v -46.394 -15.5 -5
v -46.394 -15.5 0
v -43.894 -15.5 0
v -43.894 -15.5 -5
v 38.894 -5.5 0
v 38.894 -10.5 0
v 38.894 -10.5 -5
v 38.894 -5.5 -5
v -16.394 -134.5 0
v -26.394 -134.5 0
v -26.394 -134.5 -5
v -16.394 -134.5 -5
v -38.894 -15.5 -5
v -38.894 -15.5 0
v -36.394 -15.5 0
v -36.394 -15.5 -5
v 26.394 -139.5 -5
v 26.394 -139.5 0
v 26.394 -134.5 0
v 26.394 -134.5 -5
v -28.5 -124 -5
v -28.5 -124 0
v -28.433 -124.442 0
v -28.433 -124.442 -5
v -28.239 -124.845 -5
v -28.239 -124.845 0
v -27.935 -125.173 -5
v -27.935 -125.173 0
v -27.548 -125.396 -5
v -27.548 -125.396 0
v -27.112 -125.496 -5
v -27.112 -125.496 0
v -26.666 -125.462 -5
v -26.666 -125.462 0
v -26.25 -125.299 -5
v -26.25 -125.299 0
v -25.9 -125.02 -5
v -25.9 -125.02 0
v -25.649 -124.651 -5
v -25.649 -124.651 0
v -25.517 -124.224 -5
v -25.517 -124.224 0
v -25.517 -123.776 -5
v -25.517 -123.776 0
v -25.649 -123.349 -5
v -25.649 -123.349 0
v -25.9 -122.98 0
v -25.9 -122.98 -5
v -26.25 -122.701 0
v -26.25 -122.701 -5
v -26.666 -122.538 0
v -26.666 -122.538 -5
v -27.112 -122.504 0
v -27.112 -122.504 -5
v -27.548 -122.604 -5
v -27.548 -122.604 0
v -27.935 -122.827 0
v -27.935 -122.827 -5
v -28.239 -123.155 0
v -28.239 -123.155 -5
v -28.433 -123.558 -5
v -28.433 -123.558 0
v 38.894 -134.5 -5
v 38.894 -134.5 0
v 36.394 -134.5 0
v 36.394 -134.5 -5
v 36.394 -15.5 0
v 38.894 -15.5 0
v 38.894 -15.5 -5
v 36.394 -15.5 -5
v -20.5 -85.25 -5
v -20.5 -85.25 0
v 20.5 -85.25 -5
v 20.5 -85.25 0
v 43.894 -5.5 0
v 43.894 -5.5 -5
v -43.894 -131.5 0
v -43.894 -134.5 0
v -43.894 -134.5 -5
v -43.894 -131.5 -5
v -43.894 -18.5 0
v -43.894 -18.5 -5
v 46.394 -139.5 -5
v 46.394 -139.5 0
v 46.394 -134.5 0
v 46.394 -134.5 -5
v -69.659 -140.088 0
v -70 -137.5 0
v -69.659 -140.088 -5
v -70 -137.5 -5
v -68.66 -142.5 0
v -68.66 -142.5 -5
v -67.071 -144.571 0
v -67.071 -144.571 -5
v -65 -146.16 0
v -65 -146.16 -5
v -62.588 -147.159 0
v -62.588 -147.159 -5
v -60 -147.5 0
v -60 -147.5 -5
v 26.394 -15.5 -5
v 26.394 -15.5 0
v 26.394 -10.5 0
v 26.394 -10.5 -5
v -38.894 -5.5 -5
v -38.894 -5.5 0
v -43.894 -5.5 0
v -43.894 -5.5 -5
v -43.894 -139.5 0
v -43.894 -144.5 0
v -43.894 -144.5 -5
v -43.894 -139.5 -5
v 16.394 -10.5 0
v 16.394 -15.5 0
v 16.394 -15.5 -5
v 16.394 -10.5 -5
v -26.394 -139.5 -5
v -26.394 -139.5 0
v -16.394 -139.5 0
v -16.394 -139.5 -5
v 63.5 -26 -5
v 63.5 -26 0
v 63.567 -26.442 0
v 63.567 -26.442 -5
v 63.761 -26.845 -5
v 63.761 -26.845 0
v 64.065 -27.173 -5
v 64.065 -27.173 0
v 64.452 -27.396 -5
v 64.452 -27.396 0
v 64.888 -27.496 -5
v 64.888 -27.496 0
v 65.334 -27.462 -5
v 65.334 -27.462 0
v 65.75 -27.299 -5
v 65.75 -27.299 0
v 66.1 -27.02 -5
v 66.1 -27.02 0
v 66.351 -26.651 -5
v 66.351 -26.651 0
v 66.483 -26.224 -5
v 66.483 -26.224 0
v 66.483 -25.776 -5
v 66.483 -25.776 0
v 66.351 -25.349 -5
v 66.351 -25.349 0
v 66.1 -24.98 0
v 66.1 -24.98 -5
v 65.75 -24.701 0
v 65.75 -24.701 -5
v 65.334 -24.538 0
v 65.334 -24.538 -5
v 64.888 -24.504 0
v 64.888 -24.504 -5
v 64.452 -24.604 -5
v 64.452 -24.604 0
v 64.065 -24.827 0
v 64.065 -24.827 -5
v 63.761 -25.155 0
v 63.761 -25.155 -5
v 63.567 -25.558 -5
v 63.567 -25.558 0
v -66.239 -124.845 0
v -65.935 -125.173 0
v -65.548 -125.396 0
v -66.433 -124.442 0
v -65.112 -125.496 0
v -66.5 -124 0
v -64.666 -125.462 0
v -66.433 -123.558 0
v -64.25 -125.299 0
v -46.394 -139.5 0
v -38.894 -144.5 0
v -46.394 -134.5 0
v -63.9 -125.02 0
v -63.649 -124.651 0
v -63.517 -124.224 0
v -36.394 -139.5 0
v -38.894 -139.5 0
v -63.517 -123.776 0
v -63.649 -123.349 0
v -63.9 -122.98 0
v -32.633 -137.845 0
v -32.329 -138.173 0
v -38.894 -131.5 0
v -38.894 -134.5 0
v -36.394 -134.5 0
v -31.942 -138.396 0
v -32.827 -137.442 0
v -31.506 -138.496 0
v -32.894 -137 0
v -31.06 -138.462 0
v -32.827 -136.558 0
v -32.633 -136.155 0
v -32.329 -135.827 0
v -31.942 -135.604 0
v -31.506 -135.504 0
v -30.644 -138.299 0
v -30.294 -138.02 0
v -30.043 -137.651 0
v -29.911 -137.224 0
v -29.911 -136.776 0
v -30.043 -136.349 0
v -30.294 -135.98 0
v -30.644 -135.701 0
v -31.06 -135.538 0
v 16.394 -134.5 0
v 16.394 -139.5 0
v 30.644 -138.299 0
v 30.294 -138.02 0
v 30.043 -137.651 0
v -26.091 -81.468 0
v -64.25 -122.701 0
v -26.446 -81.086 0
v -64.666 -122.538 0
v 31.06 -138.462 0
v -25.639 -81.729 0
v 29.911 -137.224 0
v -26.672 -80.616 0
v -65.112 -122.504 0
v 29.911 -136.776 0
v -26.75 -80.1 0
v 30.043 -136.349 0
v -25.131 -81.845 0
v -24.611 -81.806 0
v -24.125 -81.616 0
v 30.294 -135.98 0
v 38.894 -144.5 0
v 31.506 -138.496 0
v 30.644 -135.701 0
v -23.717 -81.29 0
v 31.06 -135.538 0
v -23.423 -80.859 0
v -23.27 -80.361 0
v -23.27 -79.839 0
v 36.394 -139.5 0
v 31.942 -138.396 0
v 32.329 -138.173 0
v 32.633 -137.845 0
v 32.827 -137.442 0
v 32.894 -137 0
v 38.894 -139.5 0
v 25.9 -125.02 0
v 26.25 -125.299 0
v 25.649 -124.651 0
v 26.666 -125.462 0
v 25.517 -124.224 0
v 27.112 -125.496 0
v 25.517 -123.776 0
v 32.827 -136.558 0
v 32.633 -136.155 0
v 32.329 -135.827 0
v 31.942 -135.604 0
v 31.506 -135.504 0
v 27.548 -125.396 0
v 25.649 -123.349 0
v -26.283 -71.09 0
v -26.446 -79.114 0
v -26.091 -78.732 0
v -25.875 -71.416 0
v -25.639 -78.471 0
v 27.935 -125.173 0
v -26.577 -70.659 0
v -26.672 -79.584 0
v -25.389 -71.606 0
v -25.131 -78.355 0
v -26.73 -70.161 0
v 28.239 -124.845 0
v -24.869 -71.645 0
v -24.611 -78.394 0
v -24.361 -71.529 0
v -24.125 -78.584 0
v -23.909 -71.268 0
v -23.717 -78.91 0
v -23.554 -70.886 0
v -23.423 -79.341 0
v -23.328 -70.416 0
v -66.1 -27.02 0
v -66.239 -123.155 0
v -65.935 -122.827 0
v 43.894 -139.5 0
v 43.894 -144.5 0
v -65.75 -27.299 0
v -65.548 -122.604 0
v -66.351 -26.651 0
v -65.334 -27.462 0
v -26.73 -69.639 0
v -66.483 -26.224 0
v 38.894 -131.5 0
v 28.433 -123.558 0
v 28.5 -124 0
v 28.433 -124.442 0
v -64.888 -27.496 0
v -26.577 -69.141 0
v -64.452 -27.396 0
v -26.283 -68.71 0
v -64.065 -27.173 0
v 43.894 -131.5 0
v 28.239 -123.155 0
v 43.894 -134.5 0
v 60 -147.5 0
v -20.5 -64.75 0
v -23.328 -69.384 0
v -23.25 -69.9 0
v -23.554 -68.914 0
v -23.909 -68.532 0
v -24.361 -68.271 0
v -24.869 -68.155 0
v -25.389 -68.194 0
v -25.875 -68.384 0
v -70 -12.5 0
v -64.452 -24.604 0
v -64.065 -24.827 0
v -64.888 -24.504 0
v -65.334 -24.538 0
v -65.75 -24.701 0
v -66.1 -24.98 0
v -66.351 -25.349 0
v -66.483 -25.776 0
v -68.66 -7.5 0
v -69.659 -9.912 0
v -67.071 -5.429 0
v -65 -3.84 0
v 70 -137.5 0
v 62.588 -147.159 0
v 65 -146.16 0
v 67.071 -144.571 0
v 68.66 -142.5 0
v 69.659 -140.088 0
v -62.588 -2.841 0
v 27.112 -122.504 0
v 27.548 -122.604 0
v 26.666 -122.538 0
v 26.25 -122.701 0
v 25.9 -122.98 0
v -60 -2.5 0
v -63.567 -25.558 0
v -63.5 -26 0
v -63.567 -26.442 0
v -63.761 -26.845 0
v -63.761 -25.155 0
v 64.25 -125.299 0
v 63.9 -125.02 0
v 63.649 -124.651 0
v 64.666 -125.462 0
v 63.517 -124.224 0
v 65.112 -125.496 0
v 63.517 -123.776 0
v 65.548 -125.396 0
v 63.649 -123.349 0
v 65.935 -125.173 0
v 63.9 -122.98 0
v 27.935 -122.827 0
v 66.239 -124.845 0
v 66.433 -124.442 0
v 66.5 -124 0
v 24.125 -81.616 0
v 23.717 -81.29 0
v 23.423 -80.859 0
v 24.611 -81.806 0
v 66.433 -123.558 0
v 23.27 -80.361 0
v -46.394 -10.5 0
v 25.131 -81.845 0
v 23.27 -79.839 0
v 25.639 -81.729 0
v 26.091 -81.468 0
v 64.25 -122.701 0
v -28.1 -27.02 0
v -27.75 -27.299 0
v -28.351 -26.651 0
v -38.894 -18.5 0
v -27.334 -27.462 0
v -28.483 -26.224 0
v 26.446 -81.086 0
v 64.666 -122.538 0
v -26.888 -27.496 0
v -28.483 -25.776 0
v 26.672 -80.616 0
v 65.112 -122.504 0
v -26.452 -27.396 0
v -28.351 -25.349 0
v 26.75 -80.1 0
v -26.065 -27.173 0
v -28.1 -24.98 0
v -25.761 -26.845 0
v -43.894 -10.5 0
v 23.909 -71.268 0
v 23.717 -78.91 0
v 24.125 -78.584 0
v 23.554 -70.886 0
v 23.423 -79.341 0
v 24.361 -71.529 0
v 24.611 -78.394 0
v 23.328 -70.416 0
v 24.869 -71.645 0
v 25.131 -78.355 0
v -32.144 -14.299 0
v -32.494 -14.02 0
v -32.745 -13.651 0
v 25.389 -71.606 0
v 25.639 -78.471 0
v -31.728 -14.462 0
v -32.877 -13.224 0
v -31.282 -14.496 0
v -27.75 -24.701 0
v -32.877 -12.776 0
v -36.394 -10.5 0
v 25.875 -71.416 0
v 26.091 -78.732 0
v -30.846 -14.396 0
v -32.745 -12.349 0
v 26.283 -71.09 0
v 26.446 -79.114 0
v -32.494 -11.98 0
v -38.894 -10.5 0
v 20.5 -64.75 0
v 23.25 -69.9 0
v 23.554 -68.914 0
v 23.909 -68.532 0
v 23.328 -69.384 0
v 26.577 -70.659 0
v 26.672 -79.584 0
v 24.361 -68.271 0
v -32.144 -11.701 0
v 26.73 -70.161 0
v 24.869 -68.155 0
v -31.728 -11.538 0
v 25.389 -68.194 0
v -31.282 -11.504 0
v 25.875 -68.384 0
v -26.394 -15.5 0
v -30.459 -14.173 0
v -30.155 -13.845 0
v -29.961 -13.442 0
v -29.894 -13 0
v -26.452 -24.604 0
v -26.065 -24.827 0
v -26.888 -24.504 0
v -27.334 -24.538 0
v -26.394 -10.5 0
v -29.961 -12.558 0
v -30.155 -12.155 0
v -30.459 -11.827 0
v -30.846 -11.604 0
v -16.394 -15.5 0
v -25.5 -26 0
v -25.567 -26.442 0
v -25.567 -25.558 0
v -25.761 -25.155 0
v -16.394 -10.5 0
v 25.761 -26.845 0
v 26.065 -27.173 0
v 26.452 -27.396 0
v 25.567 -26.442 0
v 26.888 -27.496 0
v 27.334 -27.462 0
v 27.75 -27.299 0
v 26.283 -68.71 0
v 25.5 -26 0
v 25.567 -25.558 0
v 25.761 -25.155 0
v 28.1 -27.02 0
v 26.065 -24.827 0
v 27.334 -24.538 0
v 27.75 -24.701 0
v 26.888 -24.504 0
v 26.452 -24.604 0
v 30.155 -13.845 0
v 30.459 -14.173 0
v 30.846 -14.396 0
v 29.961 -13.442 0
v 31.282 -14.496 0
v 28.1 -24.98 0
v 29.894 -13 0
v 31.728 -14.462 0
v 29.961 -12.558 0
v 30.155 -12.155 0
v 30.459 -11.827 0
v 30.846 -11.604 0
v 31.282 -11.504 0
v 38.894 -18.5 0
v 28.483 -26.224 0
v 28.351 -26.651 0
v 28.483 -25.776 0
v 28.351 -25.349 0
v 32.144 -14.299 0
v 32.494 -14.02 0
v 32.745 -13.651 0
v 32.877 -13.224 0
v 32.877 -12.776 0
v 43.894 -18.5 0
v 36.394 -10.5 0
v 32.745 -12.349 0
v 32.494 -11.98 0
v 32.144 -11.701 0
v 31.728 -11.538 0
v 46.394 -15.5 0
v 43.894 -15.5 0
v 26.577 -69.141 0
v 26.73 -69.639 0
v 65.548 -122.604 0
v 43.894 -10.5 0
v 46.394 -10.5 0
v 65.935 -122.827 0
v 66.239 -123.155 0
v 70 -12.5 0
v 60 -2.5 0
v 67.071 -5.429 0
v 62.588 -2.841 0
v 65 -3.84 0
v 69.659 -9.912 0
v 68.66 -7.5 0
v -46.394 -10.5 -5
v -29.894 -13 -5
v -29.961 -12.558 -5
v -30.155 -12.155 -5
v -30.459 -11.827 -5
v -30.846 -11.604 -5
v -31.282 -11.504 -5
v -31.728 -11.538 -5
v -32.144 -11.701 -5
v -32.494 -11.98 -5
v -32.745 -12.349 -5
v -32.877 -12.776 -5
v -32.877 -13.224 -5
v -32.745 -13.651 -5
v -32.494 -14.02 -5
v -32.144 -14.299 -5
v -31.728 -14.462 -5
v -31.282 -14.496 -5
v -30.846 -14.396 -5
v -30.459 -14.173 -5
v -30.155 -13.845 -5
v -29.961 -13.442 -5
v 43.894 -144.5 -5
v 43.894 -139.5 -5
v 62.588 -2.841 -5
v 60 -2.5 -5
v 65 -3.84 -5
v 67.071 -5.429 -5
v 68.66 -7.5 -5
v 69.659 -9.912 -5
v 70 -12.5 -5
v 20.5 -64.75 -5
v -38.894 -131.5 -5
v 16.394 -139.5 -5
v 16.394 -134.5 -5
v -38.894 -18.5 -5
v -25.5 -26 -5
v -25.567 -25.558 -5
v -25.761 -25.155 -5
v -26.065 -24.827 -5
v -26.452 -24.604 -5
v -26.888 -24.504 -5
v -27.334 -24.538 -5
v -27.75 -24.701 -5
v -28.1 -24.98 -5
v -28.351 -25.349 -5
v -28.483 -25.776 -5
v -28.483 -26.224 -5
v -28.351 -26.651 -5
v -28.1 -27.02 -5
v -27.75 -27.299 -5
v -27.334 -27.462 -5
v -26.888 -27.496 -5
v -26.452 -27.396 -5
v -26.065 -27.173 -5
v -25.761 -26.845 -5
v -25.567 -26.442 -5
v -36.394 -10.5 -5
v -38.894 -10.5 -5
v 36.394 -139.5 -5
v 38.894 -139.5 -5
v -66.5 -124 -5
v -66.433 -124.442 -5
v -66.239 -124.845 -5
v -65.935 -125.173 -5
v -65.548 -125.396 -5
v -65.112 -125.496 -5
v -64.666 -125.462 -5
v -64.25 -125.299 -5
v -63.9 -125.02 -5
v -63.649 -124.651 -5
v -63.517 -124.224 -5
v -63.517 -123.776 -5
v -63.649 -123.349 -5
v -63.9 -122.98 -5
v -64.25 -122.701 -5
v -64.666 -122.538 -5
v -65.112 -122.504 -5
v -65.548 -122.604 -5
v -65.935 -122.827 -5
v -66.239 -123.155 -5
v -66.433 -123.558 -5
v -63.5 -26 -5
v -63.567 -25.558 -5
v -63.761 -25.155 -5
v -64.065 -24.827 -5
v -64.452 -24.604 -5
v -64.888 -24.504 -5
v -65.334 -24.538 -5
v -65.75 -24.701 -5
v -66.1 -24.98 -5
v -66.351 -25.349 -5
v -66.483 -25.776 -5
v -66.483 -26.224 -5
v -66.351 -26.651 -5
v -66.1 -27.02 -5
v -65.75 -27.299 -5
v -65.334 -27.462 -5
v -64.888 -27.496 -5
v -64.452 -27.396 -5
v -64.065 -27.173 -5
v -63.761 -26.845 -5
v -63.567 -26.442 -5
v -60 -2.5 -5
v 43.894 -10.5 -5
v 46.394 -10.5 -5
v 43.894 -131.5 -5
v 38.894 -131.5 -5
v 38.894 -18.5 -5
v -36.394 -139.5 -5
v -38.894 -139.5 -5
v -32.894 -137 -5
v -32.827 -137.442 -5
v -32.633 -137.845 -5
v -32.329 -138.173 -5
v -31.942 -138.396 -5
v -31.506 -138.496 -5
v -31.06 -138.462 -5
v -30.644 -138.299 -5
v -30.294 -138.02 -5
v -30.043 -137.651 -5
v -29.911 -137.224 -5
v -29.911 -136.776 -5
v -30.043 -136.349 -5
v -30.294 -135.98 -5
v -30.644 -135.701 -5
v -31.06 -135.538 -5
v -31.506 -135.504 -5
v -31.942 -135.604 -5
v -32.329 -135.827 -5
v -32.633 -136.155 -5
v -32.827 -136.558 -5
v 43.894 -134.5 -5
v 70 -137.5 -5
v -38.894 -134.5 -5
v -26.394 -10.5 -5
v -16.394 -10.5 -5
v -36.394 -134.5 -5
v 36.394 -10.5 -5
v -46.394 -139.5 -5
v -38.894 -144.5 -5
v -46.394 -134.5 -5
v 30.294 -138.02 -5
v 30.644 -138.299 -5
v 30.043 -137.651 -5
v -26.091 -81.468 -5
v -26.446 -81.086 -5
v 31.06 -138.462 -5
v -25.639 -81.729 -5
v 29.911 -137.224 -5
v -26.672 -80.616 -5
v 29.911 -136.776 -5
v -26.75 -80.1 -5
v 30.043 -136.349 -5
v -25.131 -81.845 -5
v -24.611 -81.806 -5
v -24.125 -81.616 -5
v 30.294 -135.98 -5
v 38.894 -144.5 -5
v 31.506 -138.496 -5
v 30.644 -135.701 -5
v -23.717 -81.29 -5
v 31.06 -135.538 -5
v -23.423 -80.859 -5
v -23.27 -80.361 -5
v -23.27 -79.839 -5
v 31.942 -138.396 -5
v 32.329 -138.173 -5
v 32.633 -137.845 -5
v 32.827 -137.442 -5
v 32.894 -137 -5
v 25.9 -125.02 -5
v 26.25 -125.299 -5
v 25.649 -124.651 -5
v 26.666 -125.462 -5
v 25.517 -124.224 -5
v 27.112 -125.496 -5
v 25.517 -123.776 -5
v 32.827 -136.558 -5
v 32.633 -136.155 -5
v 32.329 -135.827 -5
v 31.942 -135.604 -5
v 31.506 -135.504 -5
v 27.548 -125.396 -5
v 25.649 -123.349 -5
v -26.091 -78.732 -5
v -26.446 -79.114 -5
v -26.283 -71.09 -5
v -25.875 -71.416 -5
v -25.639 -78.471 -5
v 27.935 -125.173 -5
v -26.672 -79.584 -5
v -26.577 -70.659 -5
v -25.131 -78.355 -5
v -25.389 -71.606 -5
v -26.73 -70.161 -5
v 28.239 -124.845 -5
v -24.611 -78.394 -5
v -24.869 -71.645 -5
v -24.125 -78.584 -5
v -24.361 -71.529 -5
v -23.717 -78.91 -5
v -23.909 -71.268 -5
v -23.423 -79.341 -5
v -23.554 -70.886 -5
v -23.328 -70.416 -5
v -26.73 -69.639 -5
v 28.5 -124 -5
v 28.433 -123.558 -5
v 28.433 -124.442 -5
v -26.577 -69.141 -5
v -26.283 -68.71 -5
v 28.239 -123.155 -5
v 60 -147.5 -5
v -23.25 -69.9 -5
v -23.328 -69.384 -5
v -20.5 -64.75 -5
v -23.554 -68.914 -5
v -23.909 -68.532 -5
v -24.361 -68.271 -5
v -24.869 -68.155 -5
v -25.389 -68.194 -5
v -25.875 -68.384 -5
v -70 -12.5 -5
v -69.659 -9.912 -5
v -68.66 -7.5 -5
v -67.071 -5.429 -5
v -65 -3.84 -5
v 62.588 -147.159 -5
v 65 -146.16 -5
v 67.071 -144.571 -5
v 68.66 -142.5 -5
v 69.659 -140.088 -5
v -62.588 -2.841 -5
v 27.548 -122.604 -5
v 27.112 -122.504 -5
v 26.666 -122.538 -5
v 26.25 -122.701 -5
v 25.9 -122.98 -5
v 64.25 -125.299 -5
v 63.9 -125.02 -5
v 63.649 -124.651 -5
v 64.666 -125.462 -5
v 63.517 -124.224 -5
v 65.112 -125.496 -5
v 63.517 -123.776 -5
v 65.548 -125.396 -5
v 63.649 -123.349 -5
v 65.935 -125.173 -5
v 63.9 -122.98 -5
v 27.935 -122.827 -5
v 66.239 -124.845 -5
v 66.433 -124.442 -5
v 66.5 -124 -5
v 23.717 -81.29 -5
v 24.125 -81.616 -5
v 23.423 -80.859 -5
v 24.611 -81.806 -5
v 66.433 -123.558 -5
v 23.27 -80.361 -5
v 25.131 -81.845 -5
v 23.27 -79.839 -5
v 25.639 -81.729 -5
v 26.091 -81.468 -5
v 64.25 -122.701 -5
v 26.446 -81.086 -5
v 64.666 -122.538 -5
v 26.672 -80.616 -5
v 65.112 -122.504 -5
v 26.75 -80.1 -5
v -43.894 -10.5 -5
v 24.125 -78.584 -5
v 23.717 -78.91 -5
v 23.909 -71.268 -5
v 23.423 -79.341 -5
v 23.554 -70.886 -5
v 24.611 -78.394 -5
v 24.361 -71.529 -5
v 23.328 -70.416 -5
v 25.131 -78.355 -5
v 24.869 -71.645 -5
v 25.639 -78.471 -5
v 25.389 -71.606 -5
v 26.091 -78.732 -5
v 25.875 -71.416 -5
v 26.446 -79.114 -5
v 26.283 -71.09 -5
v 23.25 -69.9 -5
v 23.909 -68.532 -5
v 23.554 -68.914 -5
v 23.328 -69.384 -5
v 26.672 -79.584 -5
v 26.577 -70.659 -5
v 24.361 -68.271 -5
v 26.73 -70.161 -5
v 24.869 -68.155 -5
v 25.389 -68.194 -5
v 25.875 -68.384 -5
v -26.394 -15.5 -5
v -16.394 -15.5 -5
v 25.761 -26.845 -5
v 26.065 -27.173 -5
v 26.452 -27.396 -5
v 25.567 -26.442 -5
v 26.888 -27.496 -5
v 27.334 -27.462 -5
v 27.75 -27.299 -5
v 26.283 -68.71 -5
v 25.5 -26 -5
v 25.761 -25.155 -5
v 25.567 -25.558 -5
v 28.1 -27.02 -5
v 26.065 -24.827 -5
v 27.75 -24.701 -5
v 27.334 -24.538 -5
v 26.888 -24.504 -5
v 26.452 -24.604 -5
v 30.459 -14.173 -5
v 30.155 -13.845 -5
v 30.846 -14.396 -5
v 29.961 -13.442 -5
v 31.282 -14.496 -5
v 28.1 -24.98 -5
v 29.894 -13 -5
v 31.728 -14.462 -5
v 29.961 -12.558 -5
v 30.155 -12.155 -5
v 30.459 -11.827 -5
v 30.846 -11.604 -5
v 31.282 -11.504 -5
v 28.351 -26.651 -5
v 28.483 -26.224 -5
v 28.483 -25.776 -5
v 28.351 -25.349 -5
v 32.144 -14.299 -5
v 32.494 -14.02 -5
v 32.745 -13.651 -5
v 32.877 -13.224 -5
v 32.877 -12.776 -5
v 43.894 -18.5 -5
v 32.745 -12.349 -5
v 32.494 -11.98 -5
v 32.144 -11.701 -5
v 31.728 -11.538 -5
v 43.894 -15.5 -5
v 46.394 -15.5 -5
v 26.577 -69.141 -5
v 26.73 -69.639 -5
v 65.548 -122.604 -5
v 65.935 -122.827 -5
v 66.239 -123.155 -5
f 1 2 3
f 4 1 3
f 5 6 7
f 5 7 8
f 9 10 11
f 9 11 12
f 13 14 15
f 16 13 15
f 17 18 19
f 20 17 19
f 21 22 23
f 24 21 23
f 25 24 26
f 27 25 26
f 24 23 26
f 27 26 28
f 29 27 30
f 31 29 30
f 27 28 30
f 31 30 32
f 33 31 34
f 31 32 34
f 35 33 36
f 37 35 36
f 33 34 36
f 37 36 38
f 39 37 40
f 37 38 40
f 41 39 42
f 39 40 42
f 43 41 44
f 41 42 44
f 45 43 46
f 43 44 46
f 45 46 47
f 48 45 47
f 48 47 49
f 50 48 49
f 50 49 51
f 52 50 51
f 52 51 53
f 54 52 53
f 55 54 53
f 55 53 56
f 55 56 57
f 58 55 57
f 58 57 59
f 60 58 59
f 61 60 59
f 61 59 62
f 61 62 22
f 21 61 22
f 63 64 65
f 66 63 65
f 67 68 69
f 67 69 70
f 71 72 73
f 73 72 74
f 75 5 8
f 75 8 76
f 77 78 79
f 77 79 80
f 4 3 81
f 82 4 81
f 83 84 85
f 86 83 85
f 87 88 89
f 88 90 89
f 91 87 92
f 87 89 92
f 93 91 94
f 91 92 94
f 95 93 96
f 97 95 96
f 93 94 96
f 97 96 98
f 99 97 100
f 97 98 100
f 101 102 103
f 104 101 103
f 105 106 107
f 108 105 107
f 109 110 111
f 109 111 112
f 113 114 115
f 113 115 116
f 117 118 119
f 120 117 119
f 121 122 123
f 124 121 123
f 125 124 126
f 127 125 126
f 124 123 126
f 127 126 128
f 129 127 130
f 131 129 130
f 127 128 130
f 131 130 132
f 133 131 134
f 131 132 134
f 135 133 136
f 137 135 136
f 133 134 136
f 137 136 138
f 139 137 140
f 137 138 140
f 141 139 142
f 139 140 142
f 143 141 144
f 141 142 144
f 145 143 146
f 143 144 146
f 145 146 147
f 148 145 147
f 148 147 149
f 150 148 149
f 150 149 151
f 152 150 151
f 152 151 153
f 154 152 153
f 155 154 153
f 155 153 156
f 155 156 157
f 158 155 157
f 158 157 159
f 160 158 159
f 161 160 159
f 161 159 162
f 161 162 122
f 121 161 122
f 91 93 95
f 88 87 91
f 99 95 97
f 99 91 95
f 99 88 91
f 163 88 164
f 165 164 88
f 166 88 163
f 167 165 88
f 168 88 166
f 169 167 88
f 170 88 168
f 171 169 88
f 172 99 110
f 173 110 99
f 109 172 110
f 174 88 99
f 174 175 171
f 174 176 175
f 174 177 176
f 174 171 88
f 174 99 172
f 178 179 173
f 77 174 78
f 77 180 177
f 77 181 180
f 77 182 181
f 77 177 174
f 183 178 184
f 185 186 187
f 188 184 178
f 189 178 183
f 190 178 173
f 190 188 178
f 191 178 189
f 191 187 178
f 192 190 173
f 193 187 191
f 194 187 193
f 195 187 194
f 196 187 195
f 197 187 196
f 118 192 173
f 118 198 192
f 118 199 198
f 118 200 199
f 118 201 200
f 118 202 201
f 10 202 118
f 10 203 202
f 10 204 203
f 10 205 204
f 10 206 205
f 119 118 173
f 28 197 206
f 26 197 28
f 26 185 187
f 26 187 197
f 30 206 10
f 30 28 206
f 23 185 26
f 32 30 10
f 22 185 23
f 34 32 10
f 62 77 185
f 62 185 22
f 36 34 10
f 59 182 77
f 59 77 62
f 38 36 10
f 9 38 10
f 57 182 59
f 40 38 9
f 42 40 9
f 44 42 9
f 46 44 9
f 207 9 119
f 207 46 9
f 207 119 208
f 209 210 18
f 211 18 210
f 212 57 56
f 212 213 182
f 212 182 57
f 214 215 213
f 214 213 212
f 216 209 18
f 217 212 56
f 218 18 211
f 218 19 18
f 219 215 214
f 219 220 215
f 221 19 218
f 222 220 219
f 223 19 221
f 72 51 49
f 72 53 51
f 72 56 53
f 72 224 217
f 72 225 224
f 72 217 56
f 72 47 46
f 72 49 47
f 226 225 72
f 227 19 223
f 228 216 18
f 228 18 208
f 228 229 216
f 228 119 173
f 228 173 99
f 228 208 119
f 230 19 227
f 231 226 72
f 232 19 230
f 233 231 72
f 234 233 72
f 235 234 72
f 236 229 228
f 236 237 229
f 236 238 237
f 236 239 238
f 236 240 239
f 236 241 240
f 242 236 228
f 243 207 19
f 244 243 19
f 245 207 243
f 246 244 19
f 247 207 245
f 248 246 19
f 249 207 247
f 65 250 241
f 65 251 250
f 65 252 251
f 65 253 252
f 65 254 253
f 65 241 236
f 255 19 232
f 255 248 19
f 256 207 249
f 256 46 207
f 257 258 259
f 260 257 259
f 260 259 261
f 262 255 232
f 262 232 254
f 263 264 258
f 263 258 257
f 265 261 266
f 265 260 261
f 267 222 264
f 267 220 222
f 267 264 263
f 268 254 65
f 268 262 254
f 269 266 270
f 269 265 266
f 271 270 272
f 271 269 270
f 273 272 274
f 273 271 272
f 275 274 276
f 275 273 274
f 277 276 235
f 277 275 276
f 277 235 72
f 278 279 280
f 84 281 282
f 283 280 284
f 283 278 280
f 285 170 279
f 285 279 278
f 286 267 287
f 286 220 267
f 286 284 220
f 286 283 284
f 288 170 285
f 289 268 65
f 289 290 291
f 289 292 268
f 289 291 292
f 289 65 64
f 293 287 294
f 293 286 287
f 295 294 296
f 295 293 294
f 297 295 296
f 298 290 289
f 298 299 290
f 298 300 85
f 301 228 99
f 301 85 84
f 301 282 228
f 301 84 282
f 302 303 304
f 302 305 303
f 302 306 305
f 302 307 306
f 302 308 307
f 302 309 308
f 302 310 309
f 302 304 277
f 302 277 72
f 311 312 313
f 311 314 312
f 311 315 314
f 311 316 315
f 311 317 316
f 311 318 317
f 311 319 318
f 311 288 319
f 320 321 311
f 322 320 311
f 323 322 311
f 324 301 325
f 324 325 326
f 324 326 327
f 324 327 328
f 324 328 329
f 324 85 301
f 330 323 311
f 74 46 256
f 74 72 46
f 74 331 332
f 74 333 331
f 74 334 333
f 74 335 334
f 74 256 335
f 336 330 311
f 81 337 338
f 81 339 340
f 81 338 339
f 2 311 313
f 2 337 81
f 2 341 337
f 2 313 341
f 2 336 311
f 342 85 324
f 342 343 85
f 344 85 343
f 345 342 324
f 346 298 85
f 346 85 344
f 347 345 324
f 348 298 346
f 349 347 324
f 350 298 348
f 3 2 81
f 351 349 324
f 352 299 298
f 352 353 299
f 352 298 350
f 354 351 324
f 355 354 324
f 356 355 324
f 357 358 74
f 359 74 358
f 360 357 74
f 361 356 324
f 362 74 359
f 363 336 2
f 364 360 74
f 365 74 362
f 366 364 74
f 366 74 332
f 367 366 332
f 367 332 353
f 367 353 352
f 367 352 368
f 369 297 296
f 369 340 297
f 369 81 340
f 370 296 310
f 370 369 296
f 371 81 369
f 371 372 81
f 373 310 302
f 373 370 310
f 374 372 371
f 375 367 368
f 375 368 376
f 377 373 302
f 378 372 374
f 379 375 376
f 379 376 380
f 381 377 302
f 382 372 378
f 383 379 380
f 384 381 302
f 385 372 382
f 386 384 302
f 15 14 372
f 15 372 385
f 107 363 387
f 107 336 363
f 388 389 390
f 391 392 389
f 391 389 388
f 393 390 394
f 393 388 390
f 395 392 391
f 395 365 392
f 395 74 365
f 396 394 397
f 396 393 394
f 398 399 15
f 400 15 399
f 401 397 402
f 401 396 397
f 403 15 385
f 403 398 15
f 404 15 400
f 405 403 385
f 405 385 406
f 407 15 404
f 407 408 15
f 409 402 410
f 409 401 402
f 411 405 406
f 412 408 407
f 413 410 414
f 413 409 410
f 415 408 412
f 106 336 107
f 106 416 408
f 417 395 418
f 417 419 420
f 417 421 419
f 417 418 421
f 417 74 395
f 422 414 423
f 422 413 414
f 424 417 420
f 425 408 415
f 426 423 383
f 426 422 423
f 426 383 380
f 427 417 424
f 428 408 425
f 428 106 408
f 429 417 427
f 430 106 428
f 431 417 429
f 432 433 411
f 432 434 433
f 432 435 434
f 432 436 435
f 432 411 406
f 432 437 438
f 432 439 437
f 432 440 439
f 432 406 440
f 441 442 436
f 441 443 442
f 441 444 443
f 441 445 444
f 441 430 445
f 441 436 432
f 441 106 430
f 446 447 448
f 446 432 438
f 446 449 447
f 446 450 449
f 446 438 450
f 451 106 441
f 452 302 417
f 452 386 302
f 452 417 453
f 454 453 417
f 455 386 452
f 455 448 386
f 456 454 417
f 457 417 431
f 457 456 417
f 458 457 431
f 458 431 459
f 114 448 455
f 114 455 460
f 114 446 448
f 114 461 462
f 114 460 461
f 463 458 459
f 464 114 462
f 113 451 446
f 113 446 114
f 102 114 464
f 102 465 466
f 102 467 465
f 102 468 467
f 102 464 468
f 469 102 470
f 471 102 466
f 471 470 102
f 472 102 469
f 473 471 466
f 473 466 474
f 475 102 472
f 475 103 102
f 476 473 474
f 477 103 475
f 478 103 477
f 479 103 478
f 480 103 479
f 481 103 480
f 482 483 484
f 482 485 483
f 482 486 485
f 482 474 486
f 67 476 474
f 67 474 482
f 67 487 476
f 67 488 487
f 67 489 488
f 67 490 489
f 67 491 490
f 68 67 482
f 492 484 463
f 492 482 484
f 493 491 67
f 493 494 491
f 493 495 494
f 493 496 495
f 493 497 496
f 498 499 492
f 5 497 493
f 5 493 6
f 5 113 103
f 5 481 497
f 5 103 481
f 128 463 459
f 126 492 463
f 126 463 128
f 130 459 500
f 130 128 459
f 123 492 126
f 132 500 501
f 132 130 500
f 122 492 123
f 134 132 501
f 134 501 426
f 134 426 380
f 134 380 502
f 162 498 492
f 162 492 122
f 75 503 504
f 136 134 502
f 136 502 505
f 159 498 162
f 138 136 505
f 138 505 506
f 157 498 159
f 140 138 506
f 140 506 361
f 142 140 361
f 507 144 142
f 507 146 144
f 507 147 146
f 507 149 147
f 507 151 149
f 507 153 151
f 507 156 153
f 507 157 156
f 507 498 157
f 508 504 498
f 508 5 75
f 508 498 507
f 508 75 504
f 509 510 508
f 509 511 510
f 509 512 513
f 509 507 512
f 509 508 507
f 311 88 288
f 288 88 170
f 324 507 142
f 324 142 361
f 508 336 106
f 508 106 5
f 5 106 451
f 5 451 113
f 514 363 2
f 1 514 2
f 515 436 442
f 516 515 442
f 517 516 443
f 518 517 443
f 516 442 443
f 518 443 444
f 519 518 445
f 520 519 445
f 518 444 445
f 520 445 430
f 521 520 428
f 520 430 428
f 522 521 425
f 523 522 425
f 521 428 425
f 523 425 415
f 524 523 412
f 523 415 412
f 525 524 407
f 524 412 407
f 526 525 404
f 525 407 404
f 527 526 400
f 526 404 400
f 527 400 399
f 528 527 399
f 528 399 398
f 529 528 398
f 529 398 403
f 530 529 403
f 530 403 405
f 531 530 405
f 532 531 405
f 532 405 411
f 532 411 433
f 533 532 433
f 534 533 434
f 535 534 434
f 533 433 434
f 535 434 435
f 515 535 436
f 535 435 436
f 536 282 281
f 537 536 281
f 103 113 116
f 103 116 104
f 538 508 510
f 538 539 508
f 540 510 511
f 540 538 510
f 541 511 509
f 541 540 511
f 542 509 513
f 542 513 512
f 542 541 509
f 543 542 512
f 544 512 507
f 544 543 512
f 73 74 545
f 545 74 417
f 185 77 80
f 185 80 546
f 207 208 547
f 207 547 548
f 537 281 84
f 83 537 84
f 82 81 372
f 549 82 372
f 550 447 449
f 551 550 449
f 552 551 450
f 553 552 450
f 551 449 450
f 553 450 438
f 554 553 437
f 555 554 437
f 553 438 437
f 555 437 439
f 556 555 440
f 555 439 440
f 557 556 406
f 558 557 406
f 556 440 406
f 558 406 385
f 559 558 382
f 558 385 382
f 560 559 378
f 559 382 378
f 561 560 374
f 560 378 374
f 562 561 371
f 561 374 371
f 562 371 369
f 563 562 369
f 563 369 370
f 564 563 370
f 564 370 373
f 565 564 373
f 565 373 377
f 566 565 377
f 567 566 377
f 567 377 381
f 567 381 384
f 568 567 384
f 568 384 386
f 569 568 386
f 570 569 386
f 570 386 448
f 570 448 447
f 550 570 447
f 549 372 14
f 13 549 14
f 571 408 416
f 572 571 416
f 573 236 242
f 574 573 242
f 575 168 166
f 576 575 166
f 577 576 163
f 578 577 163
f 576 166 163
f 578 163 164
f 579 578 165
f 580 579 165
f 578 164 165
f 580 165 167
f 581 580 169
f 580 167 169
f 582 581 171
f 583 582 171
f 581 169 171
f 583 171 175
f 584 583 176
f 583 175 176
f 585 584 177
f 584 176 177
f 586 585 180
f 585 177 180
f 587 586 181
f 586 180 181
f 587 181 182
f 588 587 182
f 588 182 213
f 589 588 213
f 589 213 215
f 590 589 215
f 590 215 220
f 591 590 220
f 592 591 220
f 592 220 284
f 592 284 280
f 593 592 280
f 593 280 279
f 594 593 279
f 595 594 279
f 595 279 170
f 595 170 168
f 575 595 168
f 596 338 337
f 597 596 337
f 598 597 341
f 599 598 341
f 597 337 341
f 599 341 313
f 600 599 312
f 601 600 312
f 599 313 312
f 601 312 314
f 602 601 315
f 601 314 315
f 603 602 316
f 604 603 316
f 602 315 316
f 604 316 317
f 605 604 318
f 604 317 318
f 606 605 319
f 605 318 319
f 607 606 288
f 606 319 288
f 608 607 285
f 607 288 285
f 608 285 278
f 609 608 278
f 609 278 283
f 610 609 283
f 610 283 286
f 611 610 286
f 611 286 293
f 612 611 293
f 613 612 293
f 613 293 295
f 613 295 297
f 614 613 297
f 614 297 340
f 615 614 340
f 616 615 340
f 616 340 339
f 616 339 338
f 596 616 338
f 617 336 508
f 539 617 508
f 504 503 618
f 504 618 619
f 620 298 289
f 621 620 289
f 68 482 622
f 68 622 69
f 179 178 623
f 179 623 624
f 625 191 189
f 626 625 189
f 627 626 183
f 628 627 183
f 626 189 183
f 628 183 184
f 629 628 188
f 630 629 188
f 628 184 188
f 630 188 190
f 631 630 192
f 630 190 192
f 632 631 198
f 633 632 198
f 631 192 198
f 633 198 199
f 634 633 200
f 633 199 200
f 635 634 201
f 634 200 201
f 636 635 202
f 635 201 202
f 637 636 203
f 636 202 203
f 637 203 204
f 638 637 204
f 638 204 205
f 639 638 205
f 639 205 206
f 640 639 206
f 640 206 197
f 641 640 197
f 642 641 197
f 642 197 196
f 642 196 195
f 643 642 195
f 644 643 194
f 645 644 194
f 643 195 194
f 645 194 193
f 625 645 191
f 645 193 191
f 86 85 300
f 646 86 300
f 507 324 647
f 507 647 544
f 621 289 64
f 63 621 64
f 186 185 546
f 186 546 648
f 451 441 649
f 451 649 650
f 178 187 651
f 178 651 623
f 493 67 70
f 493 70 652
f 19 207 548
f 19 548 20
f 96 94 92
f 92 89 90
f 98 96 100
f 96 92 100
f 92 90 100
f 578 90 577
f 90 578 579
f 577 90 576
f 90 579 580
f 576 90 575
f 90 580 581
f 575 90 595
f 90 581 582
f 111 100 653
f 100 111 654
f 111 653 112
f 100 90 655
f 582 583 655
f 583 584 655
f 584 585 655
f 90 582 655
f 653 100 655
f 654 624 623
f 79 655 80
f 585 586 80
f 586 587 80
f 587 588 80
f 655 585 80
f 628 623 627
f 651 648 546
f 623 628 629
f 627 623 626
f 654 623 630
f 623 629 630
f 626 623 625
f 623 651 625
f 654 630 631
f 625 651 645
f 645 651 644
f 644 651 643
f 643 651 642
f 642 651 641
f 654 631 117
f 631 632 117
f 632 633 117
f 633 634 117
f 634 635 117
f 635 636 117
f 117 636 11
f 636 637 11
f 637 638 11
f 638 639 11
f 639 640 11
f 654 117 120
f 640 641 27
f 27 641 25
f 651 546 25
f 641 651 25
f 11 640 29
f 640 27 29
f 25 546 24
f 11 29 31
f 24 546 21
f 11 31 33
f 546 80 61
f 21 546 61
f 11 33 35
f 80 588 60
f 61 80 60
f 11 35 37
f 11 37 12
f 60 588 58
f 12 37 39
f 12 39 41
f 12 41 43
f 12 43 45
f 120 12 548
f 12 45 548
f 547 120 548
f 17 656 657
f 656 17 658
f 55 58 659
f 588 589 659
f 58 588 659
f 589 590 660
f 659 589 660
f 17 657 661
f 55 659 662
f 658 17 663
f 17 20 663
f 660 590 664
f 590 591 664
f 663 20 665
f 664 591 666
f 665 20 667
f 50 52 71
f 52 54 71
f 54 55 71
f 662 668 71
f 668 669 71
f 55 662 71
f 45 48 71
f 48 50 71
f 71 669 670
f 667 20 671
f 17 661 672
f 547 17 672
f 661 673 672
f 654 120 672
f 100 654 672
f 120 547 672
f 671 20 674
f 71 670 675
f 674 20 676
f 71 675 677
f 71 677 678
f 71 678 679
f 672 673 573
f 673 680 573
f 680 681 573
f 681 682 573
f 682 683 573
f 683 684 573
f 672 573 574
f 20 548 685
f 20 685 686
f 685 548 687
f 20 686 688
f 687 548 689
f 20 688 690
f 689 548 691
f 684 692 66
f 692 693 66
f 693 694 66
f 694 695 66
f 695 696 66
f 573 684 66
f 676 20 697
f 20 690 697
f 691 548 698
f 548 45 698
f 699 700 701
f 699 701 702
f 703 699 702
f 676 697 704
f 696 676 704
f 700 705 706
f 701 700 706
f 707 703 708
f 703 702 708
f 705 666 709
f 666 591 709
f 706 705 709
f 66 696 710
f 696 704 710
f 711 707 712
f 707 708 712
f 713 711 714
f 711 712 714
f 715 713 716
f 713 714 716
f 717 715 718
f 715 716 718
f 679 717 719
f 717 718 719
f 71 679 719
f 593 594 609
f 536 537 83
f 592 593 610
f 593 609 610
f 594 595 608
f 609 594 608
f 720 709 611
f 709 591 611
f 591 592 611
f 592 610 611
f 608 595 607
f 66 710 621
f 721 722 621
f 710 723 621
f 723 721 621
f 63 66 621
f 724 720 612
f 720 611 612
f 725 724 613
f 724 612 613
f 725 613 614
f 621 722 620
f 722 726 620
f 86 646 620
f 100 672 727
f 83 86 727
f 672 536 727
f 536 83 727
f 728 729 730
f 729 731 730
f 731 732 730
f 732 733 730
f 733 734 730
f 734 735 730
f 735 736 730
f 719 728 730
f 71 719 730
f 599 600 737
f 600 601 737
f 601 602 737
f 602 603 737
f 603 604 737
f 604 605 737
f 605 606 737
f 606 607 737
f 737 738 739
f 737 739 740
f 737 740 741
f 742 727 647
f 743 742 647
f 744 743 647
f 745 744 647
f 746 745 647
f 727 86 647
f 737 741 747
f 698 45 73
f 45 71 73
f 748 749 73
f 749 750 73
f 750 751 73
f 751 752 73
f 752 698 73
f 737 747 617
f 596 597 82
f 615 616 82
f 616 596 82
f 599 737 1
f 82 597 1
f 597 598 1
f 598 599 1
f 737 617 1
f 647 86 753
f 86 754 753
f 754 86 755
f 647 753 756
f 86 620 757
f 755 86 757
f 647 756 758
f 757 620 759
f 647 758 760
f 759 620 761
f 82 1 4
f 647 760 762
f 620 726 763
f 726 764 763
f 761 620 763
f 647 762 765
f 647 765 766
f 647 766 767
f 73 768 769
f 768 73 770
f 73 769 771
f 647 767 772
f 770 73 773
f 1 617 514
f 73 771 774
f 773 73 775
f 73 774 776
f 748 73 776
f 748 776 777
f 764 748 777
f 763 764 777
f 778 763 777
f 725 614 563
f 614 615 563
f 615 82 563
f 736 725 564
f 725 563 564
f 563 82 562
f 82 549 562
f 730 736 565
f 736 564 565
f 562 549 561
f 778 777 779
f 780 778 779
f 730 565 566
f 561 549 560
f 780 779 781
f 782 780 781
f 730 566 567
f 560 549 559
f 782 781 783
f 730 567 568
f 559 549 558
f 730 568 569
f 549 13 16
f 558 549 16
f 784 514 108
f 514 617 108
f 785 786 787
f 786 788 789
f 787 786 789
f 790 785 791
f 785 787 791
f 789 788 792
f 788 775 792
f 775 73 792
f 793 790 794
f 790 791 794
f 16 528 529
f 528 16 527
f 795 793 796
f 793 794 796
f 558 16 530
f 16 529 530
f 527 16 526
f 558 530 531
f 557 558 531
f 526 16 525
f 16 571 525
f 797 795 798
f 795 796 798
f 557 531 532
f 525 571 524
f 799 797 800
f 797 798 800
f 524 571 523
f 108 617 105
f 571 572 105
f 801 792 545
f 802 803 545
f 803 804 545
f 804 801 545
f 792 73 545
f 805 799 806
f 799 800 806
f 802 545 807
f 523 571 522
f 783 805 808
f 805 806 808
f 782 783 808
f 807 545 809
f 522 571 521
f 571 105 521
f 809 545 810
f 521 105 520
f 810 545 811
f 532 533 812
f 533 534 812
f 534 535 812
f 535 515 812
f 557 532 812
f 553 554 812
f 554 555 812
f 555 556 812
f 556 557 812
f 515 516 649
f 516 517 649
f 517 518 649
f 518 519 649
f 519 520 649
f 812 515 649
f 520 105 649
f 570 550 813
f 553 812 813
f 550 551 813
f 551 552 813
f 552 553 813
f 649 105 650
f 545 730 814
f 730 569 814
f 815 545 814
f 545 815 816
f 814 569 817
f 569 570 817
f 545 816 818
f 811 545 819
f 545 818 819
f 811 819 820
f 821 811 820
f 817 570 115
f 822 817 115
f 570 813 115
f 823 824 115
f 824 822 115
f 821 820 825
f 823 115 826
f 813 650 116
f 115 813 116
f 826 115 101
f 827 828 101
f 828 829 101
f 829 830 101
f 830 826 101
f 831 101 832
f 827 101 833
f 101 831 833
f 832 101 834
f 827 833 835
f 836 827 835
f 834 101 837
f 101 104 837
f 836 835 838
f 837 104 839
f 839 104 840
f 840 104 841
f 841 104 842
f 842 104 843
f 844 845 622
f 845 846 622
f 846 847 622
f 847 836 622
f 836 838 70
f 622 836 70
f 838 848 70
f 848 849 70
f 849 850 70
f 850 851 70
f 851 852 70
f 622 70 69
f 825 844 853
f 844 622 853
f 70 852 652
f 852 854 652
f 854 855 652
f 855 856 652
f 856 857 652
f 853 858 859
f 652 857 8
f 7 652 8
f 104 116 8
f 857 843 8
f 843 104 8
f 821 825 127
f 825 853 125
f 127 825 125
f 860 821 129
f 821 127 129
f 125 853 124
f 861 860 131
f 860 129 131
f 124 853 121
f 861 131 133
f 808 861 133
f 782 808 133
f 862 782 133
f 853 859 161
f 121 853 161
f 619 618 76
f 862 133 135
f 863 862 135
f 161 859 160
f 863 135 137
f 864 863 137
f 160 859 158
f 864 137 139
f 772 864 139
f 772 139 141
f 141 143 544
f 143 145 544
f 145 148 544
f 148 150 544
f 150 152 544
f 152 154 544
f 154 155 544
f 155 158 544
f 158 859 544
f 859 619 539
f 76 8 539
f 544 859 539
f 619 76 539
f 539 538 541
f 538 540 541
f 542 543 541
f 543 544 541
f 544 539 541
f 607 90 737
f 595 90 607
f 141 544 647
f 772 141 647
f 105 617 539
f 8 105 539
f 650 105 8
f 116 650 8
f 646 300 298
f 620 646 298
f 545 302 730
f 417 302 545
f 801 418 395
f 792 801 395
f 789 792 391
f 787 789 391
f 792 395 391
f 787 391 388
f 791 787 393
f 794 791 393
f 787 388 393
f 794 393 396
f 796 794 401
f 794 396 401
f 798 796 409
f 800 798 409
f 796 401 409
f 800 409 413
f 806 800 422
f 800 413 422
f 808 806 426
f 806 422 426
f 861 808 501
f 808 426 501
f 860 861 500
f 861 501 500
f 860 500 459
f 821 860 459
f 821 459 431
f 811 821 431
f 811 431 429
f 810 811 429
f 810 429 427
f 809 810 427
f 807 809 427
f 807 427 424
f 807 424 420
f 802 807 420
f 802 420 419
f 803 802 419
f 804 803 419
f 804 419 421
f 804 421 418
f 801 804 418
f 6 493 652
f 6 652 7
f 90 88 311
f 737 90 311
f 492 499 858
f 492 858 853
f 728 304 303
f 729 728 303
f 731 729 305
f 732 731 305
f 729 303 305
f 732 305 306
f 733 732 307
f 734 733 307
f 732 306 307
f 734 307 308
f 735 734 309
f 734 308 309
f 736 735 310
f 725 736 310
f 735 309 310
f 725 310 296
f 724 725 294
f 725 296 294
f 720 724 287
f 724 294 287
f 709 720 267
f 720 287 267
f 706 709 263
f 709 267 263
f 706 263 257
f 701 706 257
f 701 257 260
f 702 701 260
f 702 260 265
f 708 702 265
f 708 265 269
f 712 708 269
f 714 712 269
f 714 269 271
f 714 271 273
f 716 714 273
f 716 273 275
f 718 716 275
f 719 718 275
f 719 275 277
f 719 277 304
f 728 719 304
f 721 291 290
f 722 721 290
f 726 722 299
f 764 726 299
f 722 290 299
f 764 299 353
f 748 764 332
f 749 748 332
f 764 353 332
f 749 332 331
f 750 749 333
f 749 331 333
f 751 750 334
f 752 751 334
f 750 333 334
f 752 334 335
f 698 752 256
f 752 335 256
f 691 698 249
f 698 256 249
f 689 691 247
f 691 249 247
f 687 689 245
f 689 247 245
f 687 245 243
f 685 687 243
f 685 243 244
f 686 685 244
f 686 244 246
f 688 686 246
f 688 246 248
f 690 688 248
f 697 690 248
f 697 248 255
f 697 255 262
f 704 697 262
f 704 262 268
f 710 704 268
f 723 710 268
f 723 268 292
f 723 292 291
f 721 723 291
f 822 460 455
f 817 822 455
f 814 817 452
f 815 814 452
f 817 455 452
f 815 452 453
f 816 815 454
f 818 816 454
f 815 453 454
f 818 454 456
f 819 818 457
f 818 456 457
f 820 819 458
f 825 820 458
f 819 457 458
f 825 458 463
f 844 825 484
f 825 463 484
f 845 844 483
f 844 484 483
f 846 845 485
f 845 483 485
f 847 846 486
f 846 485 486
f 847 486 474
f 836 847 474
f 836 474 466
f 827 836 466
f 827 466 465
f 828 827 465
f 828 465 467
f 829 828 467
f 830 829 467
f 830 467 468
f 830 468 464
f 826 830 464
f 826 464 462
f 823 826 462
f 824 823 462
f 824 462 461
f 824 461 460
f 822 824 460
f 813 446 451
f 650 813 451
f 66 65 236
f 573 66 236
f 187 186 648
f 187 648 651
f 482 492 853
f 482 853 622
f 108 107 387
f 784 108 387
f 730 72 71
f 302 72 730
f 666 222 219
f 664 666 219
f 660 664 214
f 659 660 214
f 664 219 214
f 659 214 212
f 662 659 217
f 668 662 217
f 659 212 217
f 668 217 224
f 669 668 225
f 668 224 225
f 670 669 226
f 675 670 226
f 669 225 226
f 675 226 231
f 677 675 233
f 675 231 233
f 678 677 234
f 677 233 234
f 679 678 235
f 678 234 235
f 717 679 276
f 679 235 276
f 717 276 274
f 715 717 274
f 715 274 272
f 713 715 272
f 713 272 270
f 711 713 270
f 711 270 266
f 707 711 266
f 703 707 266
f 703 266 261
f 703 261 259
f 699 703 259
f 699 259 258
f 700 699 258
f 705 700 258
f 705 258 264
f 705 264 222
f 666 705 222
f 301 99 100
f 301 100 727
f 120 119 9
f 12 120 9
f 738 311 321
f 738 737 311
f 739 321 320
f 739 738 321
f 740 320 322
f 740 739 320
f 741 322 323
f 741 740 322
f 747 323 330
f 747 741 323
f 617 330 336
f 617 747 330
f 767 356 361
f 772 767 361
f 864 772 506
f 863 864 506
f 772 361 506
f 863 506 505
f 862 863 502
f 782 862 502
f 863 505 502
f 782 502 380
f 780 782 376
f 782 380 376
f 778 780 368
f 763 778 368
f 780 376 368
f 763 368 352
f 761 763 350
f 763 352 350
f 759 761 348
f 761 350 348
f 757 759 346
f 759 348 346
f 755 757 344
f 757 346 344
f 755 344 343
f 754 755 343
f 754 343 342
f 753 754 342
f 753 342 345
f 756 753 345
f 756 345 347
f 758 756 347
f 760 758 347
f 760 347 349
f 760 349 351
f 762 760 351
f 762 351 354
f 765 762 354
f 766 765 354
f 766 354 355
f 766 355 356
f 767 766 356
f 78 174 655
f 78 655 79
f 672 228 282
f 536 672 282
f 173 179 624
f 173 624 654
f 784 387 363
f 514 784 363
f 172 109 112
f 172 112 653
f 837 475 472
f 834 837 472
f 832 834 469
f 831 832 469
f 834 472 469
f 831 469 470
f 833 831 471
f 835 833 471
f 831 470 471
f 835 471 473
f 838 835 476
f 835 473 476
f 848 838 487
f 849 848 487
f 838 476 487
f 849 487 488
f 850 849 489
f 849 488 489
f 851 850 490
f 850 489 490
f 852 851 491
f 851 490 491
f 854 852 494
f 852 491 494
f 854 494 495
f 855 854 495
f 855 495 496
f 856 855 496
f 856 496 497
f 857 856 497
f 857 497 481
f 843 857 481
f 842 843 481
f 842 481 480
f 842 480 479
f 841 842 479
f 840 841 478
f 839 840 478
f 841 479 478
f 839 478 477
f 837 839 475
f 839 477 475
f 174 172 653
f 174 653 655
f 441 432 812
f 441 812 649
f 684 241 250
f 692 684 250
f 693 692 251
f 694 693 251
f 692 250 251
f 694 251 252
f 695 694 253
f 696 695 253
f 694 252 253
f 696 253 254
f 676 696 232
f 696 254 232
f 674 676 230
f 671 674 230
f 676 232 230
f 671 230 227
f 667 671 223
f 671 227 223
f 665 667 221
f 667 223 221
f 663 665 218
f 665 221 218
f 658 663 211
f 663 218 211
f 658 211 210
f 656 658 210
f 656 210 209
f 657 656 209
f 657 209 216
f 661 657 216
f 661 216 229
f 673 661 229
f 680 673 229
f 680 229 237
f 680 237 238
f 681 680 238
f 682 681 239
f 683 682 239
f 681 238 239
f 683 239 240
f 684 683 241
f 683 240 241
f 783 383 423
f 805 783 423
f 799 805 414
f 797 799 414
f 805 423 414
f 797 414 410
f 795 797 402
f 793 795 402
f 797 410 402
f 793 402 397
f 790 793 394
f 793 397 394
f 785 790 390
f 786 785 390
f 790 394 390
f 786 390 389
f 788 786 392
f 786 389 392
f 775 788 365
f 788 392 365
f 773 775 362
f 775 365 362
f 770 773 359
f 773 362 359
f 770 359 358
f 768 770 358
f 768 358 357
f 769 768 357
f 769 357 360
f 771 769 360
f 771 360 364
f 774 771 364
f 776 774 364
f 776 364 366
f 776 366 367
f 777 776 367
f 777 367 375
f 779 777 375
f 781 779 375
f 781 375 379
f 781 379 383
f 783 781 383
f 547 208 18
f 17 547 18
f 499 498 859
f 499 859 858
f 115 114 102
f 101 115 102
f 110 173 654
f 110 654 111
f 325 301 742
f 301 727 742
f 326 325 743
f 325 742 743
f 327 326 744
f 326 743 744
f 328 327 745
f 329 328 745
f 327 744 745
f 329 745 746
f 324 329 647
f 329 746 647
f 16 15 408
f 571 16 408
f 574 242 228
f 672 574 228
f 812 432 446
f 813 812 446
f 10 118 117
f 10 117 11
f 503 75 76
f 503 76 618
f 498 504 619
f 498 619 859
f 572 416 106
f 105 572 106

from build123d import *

# Parameters (mm, degrees)
SKETCH1_W           = 140
SKETCH1_H           = 145
BOSS_EXTRUDE1_DEPTH = 5
SKETCH2_W           = 10
SKETCH2_H           = 5
CUT_EXTRUDE1_DEPTH  = 164.343962239
SKETCH3_R           = 1.5
CUT_EXTRUDE2_DEPTH  = 5
SKETCH4_R           = 1.5
CUT_EXTRUDE3_DEPTH  = 164.343962239
SKETCH5_R           = 1.75
SKETCH5_W           = 41
SKETCH5_H           = 20.5
CUT_EXTRUDE4_DEPTH  = 164.343962239
FILLET1_R           = 10


with BuildPart() as part:
    # Sketch1 → Boss-Extrude1 (new body)
    with BuildSketch(Plane.XY):
        with Locations((0, -75)):
            Rectangle(SKETCH1_W, SKETCH1_H)
    extrude(amount=-BOSS_EXTRUDE1_DEPTH)

    # Sketch2 → Cut-Extrude1 (cut, through all)
    with BuildSketch(Plane.XY):
        Polygon((43.894042166, -134.5), (43.894042166, -131.5), (38.894042166, -131.5), (38.894042166, -134.5), (36.394042166, -134.5), (36.394042166, -139.5), (38.894042166, -139.5), (38.894042166, -144.5), (43.894042166, -144.5), (43.894042166, -139.5), (46.394042166, -139.5), (46.394042166, -134.5), align=None)
        with Locations((21.394042166, -137)):
            Rectangle(SKETCH2_W, SKETCH2_H)
        with Locations((-21.394042166, -137)):
            Rectangle(SKETCH2_W, SKETCH2_H)
        Polygon((-46.394042166, -134.5), (-43.894042166, -134.5), (-43.894042166, -131.5), (-38.894042166, -131.5), (-38.894042166, -134.5), (-36.394042166, -134.5), (-36.394042166, -139.5), (-38.894042166, -139.5), (-38.894042166, -144.5), (-43.894042166, -144.5), (-43.894042166, -139.5), (-46.394042166, -139.5), align=None)
        Polygon((-43.894042166, -15.5), (-43.894042166, -18.5), (-38.894042166, -18.5), (-38.894042166, -15.5), (-36.394042166, -15.5), (-36.394042166, -10.5), (-38.894042166, -10.5), (-38.894042166, -5.5), (-43.894042166, -5.5), (-43.894042166, -10.5), (-46.394042166, -10.5), (-46.394042166, -15.5), align=None)
        with Locations((-21.394042166, -13)):
            Rectangle(SKETCH2_W, SKETCH2_H)
        with Locations((21.394042166, -13)):
            Rectangle(SKETCH2_W, SKETCH2_H)
        Polygon((46.394042166, -15.5), (43.894042166, -15.5), (43.894042166, -18.5), (38.894042166, -18.5), (38.894042166, -15.5), (36.394042166, -15.5), (36.394042166, -10.5), (38.894042166, -10.5), (38.894042166, -5.5), (43.894042166, -5.5), (43.894042166, -10.5), (46.394042166, -10.5), align=None)
    extrude(amount=-CUT_EXTRUDE1_DEPTH, mode=Mode.SUBTRACT)

    # Sketch3 → Cut-Extrude2 (cut)
    with BuildSketch(Plane.XY):
        with Locations((31.394042166, -137)):
            Circle(SKETCH3_R)
        with Locations(Location((-31.394042166, -137, 0), (0, 0, 180))):
            Circle(SKETCH3_R)
        with Locations(Location((31.394042166, -13, 0), (0, 0, 180))):
            Circle(SKETCH3_R)
        with Locations((-31.394042166, -13)):
            Circle(SKETCH3_R)
    extrude(amount=-CUT_EXTRUDE2_DEPTH, mode=Mode.SUBTRACT)

    # Sketch4 → Cut-Extrude3 (cut, through all)
    with BuildSketch(Plane.XY):
        with Locations((65, -124)):
            Circle(SKETCH4_R)
        with Locations((27, -124)):
            Circle(SKETCH4_R)
        with Locations(Location((27, -26, 0), (0, 0, 180))):
            Circle(SKETCH4_R)
        with Locations(Location((65, -26, 0), (0, 0, 180))):
            Circle(SKETCH4_R)
        with Locations((-27, -26)):
            Circle(SKETCH4_R)
        with Locations((-65, -26)):
            Circle(SKETCH4_R)
        with Locations(Location((-65, -124, 0), (0, 0, 180))):
            Circle(SKETCH4_R)
        with Locations(Location((-27, -124, 0), (0, 0, 180))):
            Circle(SKETCH4_R)
    extrude(amount=-CUT_EXTRUDE3_DEPTH, mode=Mode.SUBTRACT)

    # Sketch5 → Cut-Extrude4 (cut, through all)
    with BuildSketch(Plane.XY):
        with Locations((25, -80.1)):
            Circle(SKETCH5_R)
        with Locations(Location((25, -69.9, 0), (0, 0, 180))):
            Circle(SKETCH5_R)
        with Locations(Location((-25, -80.1, 0), (0, 0, 180))):
            Circle(SKETCH5_R)
        with Locations((-25, -69.9)):
            Circle(SKETCH5_R)
        with Locations((0, -75)):
            Rectangle(SKETCH5_W, SKETCH5_H)
    extrude(amount=-CUT_EXTRUDE4_DEPTH, mode=Mode.SUBTRACT)

    # Fillet1
    fillet1_edges = [part.edges().sort_by_distance(p)[0] for p in [
        (70, -147.5, -2.5),
        (-70, -147.5, -2.5),
        (-70, -2.5, -2.5),
        (70, -2.5, -2.5),
    ]]
    fillet(fillet1_edges, radius=FILLET1_R)


solid = part.part
